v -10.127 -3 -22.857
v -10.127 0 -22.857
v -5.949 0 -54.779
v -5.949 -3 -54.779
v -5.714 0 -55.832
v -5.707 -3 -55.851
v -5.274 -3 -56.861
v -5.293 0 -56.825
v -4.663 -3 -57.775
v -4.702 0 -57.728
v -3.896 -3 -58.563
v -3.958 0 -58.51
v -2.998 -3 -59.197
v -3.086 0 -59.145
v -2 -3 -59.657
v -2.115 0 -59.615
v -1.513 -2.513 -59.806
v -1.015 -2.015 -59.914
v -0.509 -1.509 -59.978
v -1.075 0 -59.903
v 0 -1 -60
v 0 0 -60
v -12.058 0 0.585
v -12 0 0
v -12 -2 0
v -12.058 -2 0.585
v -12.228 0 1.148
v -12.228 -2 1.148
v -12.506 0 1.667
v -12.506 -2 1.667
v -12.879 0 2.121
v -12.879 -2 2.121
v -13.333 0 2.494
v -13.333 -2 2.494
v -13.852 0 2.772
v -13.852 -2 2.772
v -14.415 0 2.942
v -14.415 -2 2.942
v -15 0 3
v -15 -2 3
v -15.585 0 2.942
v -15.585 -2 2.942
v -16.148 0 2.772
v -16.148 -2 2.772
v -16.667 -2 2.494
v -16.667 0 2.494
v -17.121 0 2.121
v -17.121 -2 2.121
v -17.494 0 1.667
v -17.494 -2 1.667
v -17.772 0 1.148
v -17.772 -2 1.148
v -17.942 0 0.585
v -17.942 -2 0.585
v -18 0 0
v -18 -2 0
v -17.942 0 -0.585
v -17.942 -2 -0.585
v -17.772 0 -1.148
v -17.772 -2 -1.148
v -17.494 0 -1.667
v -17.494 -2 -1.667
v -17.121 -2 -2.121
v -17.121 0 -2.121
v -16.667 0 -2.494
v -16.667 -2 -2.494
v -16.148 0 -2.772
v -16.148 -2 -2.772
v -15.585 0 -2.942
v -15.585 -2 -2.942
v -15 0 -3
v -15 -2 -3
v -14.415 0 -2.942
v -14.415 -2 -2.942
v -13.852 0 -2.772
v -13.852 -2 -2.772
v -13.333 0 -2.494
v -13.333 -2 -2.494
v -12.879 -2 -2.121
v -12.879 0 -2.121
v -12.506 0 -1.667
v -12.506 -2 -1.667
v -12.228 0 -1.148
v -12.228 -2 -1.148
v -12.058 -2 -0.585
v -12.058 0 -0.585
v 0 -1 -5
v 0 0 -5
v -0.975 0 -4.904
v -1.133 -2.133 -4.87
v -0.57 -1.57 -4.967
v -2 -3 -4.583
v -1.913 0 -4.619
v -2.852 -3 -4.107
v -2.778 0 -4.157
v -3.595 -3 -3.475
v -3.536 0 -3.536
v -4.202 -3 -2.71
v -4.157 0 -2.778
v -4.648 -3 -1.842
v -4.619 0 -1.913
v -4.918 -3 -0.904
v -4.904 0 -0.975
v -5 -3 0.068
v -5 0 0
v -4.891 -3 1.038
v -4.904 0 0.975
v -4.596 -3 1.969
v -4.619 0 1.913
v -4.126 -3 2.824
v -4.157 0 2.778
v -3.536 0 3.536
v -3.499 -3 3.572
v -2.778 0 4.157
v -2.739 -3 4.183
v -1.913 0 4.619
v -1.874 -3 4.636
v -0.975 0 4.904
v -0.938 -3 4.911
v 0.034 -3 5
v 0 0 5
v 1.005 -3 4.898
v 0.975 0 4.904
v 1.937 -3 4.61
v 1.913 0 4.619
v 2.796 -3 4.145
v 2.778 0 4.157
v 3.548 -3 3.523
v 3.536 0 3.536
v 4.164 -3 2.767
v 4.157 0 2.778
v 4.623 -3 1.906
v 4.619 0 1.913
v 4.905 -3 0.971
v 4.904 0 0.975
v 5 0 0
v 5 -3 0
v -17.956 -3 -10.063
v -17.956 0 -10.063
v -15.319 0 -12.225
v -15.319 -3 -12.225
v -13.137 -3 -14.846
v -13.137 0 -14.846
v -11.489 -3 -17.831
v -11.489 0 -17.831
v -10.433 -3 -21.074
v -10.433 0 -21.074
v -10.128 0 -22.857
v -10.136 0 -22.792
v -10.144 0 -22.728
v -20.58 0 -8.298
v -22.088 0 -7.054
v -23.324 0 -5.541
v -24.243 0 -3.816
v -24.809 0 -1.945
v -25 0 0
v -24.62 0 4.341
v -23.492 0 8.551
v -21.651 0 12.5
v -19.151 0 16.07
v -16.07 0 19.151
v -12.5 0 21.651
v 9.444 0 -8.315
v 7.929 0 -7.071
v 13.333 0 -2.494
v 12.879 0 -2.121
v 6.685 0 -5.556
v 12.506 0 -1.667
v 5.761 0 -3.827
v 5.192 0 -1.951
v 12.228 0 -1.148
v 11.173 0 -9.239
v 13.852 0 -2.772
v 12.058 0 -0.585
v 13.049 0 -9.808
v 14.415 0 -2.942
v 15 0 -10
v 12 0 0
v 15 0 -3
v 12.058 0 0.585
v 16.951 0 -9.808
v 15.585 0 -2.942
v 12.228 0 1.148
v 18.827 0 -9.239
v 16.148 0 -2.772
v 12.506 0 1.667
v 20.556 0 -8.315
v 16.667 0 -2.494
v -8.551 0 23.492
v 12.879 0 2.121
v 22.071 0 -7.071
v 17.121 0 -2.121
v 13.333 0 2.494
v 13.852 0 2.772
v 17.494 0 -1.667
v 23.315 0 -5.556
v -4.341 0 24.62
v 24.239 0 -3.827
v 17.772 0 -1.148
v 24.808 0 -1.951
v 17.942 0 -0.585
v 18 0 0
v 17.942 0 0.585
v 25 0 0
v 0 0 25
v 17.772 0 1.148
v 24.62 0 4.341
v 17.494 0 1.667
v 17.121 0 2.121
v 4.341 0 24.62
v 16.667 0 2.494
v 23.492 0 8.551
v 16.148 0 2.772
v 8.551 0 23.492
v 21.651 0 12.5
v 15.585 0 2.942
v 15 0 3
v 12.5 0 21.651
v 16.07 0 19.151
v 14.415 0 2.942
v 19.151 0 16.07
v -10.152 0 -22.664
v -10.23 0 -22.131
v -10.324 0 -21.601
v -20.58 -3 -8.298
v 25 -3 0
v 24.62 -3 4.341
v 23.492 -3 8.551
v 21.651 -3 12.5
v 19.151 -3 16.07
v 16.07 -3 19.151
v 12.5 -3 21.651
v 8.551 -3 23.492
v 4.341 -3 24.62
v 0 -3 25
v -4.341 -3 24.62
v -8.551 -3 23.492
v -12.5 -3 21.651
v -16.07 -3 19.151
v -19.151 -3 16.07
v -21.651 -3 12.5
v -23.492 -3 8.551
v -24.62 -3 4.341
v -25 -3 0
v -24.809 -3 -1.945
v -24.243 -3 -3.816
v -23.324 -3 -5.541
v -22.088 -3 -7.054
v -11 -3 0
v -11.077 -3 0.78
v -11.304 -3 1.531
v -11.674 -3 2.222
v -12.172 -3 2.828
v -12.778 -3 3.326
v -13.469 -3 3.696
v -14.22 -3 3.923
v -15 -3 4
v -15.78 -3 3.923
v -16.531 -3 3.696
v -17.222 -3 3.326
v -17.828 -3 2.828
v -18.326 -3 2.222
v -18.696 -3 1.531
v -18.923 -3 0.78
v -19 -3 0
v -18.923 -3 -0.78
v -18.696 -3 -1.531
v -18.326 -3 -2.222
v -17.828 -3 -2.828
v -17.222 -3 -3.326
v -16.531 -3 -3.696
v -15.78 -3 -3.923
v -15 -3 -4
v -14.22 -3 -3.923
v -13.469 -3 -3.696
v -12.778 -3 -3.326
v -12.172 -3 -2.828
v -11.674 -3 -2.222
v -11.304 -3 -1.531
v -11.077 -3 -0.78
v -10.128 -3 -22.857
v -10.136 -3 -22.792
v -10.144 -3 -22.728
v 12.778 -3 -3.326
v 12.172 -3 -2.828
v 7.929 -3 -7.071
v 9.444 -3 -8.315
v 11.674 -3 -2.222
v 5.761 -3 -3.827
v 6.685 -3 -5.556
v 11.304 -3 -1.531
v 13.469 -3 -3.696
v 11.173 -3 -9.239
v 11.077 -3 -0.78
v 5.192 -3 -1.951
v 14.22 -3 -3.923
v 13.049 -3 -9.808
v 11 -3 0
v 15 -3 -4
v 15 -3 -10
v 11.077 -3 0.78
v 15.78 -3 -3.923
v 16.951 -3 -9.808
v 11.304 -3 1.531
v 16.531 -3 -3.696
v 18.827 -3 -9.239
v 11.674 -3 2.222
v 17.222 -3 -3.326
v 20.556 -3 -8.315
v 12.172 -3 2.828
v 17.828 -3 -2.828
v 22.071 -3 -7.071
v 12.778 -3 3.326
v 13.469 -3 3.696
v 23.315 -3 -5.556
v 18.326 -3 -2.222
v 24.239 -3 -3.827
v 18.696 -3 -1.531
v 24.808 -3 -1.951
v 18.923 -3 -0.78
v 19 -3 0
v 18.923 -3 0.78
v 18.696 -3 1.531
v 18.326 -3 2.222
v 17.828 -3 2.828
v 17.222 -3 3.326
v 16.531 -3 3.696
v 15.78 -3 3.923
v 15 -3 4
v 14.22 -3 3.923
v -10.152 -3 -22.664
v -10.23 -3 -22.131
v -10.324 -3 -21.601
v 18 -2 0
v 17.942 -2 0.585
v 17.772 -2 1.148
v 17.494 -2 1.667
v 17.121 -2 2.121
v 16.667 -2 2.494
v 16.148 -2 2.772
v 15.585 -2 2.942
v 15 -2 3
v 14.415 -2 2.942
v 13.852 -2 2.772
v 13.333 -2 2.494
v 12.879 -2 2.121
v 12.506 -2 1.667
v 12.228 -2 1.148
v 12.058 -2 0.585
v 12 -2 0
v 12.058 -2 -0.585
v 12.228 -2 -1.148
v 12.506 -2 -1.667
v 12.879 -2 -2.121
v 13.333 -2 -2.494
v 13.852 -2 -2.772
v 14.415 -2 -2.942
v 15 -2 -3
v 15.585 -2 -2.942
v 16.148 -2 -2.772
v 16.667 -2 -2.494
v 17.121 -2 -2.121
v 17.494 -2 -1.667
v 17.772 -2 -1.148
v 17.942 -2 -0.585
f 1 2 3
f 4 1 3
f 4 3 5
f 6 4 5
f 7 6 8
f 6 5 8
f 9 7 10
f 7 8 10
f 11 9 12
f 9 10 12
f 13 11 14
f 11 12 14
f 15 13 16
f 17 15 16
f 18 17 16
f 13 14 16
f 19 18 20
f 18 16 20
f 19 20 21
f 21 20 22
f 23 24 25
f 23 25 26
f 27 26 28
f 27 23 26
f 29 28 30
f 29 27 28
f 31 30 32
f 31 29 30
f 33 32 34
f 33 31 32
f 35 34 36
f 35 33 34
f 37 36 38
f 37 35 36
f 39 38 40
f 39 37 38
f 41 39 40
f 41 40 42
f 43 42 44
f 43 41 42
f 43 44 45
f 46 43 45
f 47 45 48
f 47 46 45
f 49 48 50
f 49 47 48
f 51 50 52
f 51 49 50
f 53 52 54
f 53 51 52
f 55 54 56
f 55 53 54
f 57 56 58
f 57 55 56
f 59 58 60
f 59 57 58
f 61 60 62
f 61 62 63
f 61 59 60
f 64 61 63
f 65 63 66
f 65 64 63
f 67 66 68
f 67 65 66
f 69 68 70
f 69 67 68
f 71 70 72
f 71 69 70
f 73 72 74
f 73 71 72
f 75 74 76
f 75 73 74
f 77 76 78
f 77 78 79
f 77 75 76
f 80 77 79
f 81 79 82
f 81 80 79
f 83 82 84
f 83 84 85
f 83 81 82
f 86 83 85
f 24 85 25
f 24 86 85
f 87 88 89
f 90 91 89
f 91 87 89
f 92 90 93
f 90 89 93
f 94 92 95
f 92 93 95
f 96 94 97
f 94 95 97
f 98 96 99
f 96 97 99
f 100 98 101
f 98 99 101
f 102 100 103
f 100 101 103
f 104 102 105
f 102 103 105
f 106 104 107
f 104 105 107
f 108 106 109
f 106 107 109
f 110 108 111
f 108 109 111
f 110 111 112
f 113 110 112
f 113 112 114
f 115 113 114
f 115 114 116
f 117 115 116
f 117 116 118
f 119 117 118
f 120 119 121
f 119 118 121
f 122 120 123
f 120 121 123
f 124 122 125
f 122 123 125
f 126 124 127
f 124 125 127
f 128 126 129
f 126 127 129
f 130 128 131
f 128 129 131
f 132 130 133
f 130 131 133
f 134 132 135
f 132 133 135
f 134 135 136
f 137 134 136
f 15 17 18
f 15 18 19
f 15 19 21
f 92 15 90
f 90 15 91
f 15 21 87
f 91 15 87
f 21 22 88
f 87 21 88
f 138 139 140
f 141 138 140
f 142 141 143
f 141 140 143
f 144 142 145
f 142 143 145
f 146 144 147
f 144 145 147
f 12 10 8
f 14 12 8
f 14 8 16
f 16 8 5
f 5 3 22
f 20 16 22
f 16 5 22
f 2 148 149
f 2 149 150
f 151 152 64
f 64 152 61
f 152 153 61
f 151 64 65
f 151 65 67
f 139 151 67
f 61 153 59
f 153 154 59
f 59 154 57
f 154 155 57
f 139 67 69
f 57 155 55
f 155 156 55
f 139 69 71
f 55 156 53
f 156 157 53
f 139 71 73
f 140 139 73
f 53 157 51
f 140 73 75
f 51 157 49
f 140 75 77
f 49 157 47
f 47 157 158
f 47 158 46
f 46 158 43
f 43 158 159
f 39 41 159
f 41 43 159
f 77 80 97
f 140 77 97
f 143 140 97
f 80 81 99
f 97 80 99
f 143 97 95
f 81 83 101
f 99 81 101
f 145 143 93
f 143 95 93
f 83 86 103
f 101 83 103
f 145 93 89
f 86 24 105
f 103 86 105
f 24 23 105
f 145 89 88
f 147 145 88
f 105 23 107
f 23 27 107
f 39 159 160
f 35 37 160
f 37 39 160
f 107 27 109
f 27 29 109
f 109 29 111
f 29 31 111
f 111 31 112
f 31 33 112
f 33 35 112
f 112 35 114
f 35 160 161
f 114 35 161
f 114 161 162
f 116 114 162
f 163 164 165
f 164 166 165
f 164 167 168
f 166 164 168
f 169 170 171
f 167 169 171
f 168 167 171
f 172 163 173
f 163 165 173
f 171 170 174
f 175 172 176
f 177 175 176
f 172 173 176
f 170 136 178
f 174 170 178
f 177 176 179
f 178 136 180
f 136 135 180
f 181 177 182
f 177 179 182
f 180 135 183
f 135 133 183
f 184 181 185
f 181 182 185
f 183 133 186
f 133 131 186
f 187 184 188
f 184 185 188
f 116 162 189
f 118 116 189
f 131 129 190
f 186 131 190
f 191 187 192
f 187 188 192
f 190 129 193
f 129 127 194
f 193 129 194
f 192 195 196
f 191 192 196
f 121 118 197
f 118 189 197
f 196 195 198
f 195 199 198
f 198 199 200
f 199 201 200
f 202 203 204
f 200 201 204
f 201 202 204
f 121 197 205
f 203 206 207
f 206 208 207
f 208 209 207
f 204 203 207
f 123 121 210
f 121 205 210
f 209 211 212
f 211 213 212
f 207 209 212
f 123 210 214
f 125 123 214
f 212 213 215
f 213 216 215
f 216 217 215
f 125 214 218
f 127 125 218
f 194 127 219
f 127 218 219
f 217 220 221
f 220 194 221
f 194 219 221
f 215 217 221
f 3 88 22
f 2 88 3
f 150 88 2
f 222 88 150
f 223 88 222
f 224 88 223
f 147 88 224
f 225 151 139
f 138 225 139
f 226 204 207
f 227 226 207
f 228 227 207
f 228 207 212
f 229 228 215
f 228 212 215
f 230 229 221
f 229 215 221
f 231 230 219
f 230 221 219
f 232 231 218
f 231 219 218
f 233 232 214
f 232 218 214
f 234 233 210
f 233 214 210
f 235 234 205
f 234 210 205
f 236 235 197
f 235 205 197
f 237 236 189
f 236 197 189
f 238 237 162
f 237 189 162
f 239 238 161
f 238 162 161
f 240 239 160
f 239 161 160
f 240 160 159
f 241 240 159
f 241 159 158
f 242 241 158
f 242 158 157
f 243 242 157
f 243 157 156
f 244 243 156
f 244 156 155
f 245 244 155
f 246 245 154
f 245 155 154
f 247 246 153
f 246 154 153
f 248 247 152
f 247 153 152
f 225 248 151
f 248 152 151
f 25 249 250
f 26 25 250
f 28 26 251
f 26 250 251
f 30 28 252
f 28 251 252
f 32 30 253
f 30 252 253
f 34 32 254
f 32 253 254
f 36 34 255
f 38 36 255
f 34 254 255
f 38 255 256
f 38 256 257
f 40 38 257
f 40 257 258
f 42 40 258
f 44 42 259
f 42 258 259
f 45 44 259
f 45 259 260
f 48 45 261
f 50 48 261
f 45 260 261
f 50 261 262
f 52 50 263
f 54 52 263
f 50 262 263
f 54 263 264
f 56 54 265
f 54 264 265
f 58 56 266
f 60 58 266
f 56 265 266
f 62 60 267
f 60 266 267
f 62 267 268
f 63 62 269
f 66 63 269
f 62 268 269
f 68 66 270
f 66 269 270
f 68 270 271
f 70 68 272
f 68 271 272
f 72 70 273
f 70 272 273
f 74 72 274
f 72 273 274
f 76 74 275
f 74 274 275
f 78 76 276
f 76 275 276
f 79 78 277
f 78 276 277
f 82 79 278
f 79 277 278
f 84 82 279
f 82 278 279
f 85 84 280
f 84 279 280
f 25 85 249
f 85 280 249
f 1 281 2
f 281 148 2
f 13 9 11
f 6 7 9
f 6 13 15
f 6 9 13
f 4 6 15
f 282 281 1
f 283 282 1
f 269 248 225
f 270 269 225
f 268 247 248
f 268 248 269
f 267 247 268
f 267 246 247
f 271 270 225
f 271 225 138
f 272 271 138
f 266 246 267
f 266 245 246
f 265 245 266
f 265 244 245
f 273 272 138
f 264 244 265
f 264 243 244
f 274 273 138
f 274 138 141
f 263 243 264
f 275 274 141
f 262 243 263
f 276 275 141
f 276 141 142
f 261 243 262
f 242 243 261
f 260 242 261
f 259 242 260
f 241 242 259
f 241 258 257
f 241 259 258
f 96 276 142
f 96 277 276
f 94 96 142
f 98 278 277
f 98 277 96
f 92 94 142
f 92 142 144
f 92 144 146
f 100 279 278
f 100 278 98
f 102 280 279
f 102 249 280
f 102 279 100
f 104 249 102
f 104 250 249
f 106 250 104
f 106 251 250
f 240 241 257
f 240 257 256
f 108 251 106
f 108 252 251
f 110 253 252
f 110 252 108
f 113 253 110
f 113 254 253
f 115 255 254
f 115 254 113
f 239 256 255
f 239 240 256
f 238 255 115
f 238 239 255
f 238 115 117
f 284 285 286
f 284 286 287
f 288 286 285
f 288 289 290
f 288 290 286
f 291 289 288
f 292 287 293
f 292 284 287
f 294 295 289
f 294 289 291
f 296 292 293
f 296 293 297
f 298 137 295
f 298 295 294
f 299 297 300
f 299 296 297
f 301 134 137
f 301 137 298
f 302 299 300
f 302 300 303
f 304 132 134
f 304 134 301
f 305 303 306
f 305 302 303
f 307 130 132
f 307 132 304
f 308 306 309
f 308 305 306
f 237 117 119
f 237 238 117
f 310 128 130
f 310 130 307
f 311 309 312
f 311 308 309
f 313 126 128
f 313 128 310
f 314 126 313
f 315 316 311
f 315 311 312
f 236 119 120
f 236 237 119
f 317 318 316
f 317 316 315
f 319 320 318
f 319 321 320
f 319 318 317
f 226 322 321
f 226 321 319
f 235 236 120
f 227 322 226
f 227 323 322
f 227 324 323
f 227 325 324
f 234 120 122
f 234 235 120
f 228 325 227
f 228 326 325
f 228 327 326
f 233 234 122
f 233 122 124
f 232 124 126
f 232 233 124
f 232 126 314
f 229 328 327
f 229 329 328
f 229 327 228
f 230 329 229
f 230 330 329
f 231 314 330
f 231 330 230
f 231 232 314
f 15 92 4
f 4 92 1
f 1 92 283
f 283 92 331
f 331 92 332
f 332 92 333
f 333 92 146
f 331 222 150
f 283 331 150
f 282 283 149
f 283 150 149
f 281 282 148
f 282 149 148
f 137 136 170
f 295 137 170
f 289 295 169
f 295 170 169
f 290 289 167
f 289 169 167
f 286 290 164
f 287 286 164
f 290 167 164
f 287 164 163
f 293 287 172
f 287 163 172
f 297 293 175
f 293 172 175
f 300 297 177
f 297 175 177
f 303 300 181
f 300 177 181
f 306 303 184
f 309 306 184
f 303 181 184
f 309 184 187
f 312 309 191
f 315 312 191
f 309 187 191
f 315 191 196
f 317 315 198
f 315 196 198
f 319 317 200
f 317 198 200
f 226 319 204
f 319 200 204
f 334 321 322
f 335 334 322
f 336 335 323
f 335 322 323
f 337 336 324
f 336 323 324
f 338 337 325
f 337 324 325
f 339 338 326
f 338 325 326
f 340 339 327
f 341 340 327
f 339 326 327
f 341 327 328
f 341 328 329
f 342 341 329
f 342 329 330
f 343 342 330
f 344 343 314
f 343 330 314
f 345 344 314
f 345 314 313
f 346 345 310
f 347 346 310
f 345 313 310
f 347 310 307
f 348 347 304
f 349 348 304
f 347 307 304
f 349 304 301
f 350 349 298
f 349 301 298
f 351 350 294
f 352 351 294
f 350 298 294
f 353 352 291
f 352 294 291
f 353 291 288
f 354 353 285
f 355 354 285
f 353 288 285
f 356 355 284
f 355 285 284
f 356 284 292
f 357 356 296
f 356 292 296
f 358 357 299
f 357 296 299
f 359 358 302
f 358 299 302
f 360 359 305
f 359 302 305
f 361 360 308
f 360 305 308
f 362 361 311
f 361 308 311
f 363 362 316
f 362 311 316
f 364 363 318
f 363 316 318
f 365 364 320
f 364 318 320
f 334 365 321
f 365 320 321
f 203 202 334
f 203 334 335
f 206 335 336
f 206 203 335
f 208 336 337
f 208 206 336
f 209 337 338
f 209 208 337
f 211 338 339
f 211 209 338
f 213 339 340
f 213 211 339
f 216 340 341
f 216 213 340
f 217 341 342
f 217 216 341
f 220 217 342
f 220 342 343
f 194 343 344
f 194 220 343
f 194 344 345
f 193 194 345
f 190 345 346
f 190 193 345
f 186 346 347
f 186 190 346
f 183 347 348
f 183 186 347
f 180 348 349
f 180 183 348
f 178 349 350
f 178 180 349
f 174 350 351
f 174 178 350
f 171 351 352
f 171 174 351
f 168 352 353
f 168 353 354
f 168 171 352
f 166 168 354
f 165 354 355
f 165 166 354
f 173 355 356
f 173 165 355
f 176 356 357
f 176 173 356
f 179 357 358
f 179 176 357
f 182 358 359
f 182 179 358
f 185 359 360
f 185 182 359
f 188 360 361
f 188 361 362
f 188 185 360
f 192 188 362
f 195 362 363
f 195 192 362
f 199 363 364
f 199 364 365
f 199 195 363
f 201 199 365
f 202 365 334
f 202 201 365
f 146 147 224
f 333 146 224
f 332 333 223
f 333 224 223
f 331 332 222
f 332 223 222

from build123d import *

# Parameters (mm, degrees)
F0_R     = 3
F1_DEPTH = 3
F2_SIZE  = 1
F3_SIZE  = 2


with BuildPart() as f1:
    # F0 (on Front) → F1 (new body)
    with BuildSketch(Plane.XZ):
        with BuildLine():
            ThreePointArc((5, 0), (15, -10), (25, 0))
            ThreePointArc((25, 0), (0, 25), (-25, 0))
            ThreePointArc((-25, 0), (-23.826115, -4.701031), (-20.580062, -8.298368))
            Line((-20.580062, -8.298368), (-17.955888, -10.062938))
            ThreePointArc((-17.955888, -10.062938), (-13.137419, -14.846001), (-10.433443, -21.073669))
            Line((-10.433443, -21.073669), (-10.024779, -22.902048))
            ThreePointArc((-10.024779, -22.902048), (-10.075894, -22.879606), (-10.126959, -22.857049))
            Line((-10.126959, -22.857049), (-5.949267, -54.778603))
            ThreePointArc((-5.949267, -54.778603), (-3.957801, -58.509524), (0, -60))
            Line((0, -60), (0, -57))
            Line((0, -57), (0, -5))
            ThreePointArc((0, -5), (-3.535534, 3.535534), (5, 0))
        make_face()
        with Locations((-15, 0)):
            Circle(F0_R, mode=Mode.SUBTRACT)
        with Locations((15, 0)):
            Circle(F0_R, mode=Mode.SUBTRACT)
        with BuildLine():
            Line((-10.024779, -22.902048), (-10.433443, -21.073669))
            ThreePointArc((-10.433443, -21.073669), (-10.274972, -21.865774), (-10.152199, -22.664192))
            Line((-10.152199, -22.664192), (-10.126959, -22.857049))
            ThreePointArc((-10.126959, -22.857049), (-10.075894, -22.879606), (-10.024779, -22.902048))
        make_face()
        with BuildLine():
            Line((-10.126959, -22.857049), (-10.152199, -22.664192))
            ThreePointArc((-10.152199, -22.664192), (-10.139879, -22.760341), (-10.128077, -22.856554))
            ThreePointArc((-10.128077, -22.856554), (-10.127518, -22.856802), (-10.126959, -22.857049))
        make_face()
    extrude(amount=F1_DEPTH)

    # F2
    f2_edges = [f1.edges().sort_by_distance(p)[0] for p in [
        (-18, -3, 0),
        (12, -3, 0),
    ]]
    chamfer(f2_edges, length=F2_SIZE)

    # F3
    f3_edges = [f1.edges().sort_by_distance(p)[0] for p in [
        (0, -3, -32.5),
    ]]
    chamfer(f3_edges, length=F3_SIZE)


solid = f1.part
